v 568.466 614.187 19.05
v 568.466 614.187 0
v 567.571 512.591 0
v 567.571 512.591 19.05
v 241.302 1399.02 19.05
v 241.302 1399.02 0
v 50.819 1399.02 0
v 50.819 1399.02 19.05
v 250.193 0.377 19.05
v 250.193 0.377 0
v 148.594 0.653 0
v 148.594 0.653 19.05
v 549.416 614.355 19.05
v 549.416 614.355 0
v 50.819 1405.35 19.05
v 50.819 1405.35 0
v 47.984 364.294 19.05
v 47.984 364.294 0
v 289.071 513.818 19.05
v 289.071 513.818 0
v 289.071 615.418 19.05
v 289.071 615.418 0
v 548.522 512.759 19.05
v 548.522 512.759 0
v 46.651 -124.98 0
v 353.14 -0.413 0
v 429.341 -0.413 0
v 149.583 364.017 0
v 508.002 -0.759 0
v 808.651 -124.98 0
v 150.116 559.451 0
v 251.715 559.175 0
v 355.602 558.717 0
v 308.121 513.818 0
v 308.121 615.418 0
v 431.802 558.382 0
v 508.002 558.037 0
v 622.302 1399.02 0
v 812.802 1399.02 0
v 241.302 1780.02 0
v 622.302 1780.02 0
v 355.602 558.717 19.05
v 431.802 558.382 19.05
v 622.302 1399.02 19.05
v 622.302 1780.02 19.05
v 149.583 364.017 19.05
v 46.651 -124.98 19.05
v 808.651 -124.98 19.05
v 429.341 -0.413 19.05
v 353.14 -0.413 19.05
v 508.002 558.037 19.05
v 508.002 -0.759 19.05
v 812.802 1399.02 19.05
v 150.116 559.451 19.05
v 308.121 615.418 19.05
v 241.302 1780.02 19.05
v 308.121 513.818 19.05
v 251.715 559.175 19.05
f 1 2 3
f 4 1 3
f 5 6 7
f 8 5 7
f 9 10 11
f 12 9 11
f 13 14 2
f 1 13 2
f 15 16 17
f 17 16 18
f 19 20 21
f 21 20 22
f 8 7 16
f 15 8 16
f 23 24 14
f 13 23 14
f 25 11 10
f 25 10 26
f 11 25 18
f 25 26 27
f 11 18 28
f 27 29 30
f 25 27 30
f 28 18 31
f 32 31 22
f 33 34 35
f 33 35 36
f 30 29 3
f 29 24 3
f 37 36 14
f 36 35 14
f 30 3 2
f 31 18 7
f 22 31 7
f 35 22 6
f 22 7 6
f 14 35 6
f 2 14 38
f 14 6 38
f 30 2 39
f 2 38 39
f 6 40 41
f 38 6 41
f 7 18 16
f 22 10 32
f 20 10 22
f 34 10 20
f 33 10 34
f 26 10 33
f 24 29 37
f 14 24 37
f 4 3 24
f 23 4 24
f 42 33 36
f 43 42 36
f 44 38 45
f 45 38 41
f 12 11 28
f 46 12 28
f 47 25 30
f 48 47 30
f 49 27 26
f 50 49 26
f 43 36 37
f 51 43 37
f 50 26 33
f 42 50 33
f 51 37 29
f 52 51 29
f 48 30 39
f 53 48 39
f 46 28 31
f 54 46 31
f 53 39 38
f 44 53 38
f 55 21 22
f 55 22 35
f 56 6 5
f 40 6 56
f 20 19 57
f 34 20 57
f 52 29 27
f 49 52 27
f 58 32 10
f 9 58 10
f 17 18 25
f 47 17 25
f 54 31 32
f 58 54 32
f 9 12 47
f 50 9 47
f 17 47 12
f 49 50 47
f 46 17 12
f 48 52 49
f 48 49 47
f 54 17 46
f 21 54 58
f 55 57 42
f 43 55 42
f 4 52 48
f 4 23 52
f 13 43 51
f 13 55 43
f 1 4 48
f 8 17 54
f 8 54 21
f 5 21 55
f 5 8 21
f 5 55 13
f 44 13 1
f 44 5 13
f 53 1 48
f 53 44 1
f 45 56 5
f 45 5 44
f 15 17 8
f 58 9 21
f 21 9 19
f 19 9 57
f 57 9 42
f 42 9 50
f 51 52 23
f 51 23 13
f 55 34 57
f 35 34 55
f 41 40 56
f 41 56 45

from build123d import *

# Parameters (mm, degrees)
F0_W     = 381
F0_H     = 381
F0_W_2   = 19.05
F0_H_2   = 101.6
F1_DEPTH = 19.05


with BuildPart() as f1:
    # F0 (on Top) → F1 (new body)
    with BuildSketch(Plane.XY):
        with Locations((431.801737, 1589.52043)):
            Rectangle(F0_W, F0_H)
        Polygon((47.983605, 364.294128), (46.651042, -124.97957), (808.651042, -124.97957), (812.801737, 1399.02043), (622.301737, 1399.02043), (241.301737, 1399.02043), (50.818977, 1399.02043), (50.818977, 1405.350483), align=None)
        Polygon((148.593587, 0.653433), (149.583228, 364.017416), (150.115503, 559.451361), (251.715126, 559.174649), (250.19321, 0.376722), align=None, mode=Mode.SUBTRACT)
        with Locations((298.59611, 564.617765)):
            Rectangle(F0_W_2, F0_H_2, mode=Mode.SUBTRACT)
        Polygon((355.601737, 558.717186), (431.801737, 558.381641), (508.001737, 558.037416), (508.001737, -0.759322), (429.341096, -0.412941), (353.139618, -0.412941), align=None, mode=Mode.SUBTRACT)
        Polygon((548.521661, 512.759166), (549.416431, 614.355226), (568.465692, 614.187457), (567.570922, 512.591397), align=None, mode=Mode.SUBTRACT)
    extrude(amount=F1_DEPTH)


solid = f1.part
